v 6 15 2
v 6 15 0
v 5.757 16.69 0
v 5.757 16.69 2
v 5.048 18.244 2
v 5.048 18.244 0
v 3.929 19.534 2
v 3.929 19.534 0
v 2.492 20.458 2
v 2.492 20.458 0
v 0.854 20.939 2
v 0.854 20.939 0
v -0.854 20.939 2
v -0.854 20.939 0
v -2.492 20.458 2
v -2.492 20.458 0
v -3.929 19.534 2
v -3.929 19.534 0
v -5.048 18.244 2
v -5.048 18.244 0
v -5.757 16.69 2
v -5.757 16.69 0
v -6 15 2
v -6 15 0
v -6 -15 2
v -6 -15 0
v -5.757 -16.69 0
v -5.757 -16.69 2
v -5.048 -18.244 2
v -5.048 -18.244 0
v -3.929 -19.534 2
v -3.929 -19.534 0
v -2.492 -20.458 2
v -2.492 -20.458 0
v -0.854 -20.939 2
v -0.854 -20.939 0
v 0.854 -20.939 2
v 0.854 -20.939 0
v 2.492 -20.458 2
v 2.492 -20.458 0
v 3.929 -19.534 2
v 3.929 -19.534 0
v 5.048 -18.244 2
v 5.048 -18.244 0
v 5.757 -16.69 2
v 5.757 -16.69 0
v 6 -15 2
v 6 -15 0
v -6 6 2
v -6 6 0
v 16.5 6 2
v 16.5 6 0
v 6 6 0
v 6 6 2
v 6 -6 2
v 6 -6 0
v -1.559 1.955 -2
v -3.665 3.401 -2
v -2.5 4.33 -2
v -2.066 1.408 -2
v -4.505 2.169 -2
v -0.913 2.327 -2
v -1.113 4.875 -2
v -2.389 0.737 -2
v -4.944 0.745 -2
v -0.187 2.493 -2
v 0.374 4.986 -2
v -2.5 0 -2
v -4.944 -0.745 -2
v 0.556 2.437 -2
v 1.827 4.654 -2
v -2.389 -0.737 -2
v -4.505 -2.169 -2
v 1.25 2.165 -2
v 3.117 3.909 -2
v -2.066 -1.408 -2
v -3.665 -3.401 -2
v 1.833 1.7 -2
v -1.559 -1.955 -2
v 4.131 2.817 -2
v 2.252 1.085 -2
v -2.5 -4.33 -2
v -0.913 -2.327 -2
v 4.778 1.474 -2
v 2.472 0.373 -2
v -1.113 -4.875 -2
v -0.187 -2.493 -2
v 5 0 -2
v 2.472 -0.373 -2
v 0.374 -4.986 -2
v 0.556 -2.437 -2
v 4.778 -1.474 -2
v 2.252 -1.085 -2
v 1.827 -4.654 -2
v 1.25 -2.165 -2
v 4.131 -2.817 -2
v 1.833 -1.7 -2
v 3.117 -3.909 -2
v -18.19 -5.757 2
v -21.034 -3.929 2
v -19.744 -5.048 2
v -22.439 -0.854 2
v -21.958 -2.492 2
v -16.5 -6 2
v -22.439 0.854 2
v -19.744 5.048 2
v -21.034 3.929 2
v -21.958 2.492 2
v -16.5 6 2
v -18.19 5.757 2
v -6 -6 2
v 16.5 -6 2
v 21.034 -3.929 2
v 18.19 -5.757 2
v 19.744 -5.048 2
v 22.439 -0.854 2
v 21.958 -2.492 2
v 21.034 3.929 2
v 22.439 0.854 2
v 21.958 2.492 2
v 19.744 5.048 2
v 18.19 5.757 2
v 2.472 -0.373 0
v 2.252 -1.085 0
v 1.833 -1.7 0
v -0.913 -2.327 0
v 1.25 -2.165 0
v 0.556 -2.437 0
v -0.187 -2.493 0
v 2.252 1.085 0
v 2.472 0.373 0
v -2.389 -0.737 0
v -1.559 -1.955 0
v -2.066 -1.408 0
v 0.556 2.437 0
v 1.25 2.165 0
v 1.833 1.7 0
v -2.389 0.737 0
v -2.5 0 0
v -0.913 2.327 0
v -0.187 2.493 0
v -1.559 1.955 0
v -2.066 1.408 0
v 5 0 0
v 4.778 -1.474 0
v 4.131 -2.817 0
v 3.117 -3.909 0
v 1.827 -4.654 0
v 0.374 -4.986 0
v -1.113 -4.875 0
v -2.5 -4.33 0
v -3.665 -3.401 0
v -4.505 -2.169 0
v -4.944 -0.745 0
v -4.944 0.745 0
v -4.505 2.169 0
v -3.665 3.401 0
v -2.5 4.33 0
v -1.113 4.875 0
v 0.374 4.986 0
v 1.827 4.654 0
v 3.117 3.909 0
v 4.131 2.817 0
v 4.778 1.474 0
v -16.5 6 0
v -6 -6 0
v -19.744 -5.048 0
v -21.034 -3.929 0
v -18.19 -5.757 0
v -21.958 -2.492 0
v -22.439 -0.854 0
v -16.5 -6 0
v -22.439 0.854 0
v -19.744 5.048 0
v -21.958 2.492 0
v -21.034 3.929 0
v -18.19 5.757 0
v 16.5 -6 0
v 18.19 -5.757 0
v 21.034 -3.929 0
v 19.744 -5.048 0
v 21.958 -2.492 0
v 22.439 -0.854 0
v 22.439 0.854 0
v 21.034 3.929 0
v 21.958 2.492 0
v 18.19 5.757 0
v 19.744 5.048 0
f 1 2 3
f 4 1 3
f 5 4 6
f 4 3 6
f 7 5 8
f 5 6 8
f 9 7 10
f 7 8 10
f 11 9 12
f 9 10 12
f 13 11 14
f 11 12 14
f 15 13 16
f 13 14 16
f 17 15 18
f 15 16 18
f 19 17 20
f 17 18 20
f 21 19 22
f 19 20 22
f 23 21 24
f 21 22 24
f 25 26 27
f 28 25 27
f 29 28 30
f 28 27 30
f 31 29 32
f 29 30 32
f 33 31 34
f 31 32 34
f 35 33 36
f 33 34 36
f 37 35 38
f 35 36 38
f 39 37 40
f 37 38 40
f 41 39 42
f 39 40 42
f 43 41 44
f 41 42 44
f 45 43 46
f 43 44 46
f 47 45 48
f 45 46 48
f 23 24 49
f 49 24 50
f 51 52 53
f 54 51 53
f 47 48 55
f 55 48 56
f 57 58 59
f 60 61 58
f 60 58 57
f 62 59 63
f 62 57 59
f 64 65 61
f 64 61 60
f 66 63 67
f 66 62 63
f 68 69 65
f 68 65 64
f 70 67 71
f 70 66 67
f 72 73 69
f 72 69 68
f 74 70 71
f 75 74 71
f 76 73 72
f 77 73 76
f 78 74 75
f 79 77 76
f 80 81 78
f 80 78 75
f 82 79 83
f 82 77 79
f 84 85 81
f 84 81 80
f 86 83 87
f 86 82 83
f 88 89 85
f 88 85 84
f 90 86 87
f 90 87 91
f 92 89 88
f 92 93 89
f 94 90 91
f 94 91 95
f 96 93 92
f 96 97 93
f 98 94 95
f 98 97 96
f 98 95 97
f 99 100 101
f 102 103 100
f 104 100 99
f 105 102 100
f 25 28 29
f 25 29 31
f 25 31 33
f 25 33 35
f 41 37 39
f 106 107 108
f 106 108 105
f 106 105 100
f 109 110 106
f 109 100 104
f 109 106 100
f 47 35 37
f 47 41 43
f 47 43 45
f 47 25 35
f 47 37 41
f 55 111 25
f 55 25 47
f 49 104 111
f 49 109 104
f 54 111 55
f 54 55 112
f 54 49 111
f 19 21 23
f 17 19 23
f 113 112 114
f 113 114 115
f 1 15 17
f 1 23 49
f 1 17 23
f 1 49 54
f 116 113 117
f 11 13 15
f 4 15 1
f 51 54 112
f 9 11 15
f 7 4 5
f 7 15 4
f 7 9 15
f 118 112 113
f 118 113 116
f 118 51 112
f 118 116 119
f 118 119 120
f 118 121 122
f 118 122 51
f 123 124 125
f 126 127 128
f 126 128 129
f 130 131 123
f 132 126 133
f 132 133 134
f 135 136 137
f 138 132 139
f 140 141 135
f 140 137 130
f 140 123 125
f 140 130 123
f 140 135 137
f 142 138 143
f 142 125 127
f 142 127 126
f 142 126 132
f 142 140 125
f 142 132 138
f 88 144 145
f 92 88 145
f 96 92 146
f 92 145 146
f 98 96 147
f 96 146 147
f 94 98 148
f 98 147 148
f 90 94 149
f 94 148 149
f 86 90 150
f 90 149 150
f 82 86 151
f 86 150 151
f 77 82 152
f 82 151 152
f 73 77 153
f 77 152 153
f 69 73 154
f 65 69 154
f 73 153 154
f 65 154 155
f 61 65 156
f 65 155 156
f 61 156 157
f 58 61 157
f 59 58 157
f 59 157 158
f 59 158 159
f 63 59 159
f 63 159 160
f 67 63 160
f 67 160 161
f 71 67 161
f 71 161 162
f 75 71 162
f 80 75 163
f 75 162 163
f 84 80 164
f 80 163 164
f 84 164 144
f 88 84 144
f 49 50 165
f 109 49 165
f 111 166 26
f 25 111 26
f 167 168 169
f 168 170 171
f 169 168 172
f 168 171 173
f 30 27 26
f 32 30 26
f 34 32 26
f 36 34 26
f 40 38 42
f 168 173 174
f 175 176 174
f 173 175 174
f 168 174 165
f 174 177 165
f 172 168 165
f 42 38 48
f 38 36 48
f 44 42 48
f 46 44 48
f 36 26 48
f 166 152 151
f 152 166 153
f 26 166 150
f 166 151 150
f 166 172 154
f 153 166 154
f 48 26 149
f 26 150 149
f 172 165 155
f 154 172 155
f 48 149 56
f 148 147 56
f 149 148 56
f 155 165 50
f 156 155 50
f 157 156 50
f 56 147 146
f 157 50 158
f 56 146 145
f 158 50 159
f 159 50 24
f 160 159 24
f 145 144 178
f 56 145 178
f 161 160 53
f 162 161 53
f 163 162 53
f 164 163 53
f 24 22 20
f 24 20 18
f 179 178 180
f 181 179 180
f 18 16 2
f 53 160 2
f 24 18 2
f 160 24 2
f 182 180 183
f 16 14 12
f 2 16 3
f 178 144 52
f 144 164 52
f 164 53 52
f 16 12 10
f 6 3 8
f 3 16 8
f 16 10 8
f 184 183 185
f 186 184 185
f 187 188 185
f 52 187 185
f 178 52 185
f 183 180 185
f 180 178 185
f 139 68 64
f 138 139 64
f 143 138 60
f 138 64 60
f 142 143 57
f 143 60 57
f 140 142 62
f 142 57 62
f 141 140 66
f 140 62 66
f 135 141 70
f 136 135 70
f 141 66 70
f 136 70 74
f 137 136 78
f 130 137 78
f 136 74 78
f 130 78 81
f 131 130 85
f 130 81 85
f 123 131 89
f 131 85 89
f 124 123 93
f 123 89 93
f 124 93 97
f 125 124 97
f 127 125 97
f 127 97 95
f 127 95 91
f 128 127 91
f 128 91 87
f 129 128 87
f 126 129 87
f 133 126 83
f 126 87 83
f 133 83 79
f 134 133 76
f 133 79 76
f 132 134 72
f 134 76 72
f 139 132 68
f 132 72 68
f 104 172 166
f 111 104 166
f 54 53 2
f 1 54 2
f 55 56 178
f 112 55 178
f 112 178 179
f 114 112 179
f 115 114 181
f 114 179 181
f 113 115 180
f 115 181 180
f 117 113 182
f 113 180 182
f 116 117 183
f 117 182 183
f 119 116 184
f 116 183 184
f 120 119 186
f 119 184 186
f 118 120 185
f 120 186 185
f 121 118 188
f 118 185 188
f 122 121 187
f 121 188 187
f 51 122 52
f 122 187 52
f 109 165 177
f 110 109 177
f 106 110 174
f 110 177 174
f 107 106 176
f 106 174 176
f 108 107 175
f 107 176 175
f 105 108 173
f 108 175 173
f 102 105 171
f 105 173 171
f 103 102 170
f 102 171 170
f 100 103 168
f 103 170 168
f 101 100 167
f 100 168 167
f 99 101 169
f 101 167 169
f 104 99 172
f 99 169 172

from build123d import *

# Parameters (mm, degrees)
ESQUISSE1_W             = 12
ESQUISSE1_H             = 12
BOSS_EXTRU_1_DEPTH      = 2
ESQUISSE2_R             = 5
BOSS_EXTRU_2_DEPTH      = 2
ESQUISSE3_R             = 2.5
ENL_V_MAT_EXTRU_1_DEPTH = 2


with BuildPart() as part:
    # Esquisse1 → Boss.-Extru.1 (new body)
    with BuildSketch(Plane.XY):
        with BuildLine():
            Line((16.5, 6), (6, 6))
            Line((6, 6), (6, -6))
            Line((6, -6), (16.5, -6))
            ThreePointArc((16.5, -6), (22.5, 0), (16.5, 6))
        make_face()
        Rectangle(ESQUISSE1_W, ESQUISSE1_H)
        with BuildLine():
            Line((-6, 15), (-6, 6))
            Line((-6, 6), (6, 6))
            Line((6, 6), (6, 15))
            ThreePointArc((6, 15), (0, 21), (-6, 15))
        make_face()
        with BuildLine():
            Line((-6, 6), (-16.5, 6))
            ThreePointArc((-16.5, 6), (-22.5, 0), (-16.5, -6))
            Line((-16.5, -6), (-6, -6))
            Line((-6, -6), (-6, 6))
        make_face()
        with BuildLine():
            Line((6, -6), (-6, -6))
            Line((-6, -6), (-6, -15))
            ThreePointArc((-6, -15), (0, -21), (6, -15))
            Line((6, -15), (6, -6))
        make_face()
    extrude(amount=BOSS_EXTRU_1_DEPTH)

    # Esquisse2 → Boss.-Extru.2 (add)
    with BuildSketch(Plane(origin=(0, 0, 0), x_dir=(-1, 0, 0), z_dir=(0, 0, -1))):
        with Locations(Location((0, 0, 0), (0, 0, 180))):
            Circle(ESQUISSE2_R)
    extrude(amount=BOSS_EXTRU_2_DEPTH)

    # Esquisse3 → Enlèv. mat.-Extru.1 (cut)
    with BuildSketch(Plane(origin=(0, 0, -2), x_dir=(-1, 0, 0), z_dir=(0, 0, -1))):
        Circle(ESQUISSE3_R)
    extrude(amount=-ENL_V_MAT_EXTRU_1_DEPTH, mode=Mode.SUBTRACT)


solid = part.part
